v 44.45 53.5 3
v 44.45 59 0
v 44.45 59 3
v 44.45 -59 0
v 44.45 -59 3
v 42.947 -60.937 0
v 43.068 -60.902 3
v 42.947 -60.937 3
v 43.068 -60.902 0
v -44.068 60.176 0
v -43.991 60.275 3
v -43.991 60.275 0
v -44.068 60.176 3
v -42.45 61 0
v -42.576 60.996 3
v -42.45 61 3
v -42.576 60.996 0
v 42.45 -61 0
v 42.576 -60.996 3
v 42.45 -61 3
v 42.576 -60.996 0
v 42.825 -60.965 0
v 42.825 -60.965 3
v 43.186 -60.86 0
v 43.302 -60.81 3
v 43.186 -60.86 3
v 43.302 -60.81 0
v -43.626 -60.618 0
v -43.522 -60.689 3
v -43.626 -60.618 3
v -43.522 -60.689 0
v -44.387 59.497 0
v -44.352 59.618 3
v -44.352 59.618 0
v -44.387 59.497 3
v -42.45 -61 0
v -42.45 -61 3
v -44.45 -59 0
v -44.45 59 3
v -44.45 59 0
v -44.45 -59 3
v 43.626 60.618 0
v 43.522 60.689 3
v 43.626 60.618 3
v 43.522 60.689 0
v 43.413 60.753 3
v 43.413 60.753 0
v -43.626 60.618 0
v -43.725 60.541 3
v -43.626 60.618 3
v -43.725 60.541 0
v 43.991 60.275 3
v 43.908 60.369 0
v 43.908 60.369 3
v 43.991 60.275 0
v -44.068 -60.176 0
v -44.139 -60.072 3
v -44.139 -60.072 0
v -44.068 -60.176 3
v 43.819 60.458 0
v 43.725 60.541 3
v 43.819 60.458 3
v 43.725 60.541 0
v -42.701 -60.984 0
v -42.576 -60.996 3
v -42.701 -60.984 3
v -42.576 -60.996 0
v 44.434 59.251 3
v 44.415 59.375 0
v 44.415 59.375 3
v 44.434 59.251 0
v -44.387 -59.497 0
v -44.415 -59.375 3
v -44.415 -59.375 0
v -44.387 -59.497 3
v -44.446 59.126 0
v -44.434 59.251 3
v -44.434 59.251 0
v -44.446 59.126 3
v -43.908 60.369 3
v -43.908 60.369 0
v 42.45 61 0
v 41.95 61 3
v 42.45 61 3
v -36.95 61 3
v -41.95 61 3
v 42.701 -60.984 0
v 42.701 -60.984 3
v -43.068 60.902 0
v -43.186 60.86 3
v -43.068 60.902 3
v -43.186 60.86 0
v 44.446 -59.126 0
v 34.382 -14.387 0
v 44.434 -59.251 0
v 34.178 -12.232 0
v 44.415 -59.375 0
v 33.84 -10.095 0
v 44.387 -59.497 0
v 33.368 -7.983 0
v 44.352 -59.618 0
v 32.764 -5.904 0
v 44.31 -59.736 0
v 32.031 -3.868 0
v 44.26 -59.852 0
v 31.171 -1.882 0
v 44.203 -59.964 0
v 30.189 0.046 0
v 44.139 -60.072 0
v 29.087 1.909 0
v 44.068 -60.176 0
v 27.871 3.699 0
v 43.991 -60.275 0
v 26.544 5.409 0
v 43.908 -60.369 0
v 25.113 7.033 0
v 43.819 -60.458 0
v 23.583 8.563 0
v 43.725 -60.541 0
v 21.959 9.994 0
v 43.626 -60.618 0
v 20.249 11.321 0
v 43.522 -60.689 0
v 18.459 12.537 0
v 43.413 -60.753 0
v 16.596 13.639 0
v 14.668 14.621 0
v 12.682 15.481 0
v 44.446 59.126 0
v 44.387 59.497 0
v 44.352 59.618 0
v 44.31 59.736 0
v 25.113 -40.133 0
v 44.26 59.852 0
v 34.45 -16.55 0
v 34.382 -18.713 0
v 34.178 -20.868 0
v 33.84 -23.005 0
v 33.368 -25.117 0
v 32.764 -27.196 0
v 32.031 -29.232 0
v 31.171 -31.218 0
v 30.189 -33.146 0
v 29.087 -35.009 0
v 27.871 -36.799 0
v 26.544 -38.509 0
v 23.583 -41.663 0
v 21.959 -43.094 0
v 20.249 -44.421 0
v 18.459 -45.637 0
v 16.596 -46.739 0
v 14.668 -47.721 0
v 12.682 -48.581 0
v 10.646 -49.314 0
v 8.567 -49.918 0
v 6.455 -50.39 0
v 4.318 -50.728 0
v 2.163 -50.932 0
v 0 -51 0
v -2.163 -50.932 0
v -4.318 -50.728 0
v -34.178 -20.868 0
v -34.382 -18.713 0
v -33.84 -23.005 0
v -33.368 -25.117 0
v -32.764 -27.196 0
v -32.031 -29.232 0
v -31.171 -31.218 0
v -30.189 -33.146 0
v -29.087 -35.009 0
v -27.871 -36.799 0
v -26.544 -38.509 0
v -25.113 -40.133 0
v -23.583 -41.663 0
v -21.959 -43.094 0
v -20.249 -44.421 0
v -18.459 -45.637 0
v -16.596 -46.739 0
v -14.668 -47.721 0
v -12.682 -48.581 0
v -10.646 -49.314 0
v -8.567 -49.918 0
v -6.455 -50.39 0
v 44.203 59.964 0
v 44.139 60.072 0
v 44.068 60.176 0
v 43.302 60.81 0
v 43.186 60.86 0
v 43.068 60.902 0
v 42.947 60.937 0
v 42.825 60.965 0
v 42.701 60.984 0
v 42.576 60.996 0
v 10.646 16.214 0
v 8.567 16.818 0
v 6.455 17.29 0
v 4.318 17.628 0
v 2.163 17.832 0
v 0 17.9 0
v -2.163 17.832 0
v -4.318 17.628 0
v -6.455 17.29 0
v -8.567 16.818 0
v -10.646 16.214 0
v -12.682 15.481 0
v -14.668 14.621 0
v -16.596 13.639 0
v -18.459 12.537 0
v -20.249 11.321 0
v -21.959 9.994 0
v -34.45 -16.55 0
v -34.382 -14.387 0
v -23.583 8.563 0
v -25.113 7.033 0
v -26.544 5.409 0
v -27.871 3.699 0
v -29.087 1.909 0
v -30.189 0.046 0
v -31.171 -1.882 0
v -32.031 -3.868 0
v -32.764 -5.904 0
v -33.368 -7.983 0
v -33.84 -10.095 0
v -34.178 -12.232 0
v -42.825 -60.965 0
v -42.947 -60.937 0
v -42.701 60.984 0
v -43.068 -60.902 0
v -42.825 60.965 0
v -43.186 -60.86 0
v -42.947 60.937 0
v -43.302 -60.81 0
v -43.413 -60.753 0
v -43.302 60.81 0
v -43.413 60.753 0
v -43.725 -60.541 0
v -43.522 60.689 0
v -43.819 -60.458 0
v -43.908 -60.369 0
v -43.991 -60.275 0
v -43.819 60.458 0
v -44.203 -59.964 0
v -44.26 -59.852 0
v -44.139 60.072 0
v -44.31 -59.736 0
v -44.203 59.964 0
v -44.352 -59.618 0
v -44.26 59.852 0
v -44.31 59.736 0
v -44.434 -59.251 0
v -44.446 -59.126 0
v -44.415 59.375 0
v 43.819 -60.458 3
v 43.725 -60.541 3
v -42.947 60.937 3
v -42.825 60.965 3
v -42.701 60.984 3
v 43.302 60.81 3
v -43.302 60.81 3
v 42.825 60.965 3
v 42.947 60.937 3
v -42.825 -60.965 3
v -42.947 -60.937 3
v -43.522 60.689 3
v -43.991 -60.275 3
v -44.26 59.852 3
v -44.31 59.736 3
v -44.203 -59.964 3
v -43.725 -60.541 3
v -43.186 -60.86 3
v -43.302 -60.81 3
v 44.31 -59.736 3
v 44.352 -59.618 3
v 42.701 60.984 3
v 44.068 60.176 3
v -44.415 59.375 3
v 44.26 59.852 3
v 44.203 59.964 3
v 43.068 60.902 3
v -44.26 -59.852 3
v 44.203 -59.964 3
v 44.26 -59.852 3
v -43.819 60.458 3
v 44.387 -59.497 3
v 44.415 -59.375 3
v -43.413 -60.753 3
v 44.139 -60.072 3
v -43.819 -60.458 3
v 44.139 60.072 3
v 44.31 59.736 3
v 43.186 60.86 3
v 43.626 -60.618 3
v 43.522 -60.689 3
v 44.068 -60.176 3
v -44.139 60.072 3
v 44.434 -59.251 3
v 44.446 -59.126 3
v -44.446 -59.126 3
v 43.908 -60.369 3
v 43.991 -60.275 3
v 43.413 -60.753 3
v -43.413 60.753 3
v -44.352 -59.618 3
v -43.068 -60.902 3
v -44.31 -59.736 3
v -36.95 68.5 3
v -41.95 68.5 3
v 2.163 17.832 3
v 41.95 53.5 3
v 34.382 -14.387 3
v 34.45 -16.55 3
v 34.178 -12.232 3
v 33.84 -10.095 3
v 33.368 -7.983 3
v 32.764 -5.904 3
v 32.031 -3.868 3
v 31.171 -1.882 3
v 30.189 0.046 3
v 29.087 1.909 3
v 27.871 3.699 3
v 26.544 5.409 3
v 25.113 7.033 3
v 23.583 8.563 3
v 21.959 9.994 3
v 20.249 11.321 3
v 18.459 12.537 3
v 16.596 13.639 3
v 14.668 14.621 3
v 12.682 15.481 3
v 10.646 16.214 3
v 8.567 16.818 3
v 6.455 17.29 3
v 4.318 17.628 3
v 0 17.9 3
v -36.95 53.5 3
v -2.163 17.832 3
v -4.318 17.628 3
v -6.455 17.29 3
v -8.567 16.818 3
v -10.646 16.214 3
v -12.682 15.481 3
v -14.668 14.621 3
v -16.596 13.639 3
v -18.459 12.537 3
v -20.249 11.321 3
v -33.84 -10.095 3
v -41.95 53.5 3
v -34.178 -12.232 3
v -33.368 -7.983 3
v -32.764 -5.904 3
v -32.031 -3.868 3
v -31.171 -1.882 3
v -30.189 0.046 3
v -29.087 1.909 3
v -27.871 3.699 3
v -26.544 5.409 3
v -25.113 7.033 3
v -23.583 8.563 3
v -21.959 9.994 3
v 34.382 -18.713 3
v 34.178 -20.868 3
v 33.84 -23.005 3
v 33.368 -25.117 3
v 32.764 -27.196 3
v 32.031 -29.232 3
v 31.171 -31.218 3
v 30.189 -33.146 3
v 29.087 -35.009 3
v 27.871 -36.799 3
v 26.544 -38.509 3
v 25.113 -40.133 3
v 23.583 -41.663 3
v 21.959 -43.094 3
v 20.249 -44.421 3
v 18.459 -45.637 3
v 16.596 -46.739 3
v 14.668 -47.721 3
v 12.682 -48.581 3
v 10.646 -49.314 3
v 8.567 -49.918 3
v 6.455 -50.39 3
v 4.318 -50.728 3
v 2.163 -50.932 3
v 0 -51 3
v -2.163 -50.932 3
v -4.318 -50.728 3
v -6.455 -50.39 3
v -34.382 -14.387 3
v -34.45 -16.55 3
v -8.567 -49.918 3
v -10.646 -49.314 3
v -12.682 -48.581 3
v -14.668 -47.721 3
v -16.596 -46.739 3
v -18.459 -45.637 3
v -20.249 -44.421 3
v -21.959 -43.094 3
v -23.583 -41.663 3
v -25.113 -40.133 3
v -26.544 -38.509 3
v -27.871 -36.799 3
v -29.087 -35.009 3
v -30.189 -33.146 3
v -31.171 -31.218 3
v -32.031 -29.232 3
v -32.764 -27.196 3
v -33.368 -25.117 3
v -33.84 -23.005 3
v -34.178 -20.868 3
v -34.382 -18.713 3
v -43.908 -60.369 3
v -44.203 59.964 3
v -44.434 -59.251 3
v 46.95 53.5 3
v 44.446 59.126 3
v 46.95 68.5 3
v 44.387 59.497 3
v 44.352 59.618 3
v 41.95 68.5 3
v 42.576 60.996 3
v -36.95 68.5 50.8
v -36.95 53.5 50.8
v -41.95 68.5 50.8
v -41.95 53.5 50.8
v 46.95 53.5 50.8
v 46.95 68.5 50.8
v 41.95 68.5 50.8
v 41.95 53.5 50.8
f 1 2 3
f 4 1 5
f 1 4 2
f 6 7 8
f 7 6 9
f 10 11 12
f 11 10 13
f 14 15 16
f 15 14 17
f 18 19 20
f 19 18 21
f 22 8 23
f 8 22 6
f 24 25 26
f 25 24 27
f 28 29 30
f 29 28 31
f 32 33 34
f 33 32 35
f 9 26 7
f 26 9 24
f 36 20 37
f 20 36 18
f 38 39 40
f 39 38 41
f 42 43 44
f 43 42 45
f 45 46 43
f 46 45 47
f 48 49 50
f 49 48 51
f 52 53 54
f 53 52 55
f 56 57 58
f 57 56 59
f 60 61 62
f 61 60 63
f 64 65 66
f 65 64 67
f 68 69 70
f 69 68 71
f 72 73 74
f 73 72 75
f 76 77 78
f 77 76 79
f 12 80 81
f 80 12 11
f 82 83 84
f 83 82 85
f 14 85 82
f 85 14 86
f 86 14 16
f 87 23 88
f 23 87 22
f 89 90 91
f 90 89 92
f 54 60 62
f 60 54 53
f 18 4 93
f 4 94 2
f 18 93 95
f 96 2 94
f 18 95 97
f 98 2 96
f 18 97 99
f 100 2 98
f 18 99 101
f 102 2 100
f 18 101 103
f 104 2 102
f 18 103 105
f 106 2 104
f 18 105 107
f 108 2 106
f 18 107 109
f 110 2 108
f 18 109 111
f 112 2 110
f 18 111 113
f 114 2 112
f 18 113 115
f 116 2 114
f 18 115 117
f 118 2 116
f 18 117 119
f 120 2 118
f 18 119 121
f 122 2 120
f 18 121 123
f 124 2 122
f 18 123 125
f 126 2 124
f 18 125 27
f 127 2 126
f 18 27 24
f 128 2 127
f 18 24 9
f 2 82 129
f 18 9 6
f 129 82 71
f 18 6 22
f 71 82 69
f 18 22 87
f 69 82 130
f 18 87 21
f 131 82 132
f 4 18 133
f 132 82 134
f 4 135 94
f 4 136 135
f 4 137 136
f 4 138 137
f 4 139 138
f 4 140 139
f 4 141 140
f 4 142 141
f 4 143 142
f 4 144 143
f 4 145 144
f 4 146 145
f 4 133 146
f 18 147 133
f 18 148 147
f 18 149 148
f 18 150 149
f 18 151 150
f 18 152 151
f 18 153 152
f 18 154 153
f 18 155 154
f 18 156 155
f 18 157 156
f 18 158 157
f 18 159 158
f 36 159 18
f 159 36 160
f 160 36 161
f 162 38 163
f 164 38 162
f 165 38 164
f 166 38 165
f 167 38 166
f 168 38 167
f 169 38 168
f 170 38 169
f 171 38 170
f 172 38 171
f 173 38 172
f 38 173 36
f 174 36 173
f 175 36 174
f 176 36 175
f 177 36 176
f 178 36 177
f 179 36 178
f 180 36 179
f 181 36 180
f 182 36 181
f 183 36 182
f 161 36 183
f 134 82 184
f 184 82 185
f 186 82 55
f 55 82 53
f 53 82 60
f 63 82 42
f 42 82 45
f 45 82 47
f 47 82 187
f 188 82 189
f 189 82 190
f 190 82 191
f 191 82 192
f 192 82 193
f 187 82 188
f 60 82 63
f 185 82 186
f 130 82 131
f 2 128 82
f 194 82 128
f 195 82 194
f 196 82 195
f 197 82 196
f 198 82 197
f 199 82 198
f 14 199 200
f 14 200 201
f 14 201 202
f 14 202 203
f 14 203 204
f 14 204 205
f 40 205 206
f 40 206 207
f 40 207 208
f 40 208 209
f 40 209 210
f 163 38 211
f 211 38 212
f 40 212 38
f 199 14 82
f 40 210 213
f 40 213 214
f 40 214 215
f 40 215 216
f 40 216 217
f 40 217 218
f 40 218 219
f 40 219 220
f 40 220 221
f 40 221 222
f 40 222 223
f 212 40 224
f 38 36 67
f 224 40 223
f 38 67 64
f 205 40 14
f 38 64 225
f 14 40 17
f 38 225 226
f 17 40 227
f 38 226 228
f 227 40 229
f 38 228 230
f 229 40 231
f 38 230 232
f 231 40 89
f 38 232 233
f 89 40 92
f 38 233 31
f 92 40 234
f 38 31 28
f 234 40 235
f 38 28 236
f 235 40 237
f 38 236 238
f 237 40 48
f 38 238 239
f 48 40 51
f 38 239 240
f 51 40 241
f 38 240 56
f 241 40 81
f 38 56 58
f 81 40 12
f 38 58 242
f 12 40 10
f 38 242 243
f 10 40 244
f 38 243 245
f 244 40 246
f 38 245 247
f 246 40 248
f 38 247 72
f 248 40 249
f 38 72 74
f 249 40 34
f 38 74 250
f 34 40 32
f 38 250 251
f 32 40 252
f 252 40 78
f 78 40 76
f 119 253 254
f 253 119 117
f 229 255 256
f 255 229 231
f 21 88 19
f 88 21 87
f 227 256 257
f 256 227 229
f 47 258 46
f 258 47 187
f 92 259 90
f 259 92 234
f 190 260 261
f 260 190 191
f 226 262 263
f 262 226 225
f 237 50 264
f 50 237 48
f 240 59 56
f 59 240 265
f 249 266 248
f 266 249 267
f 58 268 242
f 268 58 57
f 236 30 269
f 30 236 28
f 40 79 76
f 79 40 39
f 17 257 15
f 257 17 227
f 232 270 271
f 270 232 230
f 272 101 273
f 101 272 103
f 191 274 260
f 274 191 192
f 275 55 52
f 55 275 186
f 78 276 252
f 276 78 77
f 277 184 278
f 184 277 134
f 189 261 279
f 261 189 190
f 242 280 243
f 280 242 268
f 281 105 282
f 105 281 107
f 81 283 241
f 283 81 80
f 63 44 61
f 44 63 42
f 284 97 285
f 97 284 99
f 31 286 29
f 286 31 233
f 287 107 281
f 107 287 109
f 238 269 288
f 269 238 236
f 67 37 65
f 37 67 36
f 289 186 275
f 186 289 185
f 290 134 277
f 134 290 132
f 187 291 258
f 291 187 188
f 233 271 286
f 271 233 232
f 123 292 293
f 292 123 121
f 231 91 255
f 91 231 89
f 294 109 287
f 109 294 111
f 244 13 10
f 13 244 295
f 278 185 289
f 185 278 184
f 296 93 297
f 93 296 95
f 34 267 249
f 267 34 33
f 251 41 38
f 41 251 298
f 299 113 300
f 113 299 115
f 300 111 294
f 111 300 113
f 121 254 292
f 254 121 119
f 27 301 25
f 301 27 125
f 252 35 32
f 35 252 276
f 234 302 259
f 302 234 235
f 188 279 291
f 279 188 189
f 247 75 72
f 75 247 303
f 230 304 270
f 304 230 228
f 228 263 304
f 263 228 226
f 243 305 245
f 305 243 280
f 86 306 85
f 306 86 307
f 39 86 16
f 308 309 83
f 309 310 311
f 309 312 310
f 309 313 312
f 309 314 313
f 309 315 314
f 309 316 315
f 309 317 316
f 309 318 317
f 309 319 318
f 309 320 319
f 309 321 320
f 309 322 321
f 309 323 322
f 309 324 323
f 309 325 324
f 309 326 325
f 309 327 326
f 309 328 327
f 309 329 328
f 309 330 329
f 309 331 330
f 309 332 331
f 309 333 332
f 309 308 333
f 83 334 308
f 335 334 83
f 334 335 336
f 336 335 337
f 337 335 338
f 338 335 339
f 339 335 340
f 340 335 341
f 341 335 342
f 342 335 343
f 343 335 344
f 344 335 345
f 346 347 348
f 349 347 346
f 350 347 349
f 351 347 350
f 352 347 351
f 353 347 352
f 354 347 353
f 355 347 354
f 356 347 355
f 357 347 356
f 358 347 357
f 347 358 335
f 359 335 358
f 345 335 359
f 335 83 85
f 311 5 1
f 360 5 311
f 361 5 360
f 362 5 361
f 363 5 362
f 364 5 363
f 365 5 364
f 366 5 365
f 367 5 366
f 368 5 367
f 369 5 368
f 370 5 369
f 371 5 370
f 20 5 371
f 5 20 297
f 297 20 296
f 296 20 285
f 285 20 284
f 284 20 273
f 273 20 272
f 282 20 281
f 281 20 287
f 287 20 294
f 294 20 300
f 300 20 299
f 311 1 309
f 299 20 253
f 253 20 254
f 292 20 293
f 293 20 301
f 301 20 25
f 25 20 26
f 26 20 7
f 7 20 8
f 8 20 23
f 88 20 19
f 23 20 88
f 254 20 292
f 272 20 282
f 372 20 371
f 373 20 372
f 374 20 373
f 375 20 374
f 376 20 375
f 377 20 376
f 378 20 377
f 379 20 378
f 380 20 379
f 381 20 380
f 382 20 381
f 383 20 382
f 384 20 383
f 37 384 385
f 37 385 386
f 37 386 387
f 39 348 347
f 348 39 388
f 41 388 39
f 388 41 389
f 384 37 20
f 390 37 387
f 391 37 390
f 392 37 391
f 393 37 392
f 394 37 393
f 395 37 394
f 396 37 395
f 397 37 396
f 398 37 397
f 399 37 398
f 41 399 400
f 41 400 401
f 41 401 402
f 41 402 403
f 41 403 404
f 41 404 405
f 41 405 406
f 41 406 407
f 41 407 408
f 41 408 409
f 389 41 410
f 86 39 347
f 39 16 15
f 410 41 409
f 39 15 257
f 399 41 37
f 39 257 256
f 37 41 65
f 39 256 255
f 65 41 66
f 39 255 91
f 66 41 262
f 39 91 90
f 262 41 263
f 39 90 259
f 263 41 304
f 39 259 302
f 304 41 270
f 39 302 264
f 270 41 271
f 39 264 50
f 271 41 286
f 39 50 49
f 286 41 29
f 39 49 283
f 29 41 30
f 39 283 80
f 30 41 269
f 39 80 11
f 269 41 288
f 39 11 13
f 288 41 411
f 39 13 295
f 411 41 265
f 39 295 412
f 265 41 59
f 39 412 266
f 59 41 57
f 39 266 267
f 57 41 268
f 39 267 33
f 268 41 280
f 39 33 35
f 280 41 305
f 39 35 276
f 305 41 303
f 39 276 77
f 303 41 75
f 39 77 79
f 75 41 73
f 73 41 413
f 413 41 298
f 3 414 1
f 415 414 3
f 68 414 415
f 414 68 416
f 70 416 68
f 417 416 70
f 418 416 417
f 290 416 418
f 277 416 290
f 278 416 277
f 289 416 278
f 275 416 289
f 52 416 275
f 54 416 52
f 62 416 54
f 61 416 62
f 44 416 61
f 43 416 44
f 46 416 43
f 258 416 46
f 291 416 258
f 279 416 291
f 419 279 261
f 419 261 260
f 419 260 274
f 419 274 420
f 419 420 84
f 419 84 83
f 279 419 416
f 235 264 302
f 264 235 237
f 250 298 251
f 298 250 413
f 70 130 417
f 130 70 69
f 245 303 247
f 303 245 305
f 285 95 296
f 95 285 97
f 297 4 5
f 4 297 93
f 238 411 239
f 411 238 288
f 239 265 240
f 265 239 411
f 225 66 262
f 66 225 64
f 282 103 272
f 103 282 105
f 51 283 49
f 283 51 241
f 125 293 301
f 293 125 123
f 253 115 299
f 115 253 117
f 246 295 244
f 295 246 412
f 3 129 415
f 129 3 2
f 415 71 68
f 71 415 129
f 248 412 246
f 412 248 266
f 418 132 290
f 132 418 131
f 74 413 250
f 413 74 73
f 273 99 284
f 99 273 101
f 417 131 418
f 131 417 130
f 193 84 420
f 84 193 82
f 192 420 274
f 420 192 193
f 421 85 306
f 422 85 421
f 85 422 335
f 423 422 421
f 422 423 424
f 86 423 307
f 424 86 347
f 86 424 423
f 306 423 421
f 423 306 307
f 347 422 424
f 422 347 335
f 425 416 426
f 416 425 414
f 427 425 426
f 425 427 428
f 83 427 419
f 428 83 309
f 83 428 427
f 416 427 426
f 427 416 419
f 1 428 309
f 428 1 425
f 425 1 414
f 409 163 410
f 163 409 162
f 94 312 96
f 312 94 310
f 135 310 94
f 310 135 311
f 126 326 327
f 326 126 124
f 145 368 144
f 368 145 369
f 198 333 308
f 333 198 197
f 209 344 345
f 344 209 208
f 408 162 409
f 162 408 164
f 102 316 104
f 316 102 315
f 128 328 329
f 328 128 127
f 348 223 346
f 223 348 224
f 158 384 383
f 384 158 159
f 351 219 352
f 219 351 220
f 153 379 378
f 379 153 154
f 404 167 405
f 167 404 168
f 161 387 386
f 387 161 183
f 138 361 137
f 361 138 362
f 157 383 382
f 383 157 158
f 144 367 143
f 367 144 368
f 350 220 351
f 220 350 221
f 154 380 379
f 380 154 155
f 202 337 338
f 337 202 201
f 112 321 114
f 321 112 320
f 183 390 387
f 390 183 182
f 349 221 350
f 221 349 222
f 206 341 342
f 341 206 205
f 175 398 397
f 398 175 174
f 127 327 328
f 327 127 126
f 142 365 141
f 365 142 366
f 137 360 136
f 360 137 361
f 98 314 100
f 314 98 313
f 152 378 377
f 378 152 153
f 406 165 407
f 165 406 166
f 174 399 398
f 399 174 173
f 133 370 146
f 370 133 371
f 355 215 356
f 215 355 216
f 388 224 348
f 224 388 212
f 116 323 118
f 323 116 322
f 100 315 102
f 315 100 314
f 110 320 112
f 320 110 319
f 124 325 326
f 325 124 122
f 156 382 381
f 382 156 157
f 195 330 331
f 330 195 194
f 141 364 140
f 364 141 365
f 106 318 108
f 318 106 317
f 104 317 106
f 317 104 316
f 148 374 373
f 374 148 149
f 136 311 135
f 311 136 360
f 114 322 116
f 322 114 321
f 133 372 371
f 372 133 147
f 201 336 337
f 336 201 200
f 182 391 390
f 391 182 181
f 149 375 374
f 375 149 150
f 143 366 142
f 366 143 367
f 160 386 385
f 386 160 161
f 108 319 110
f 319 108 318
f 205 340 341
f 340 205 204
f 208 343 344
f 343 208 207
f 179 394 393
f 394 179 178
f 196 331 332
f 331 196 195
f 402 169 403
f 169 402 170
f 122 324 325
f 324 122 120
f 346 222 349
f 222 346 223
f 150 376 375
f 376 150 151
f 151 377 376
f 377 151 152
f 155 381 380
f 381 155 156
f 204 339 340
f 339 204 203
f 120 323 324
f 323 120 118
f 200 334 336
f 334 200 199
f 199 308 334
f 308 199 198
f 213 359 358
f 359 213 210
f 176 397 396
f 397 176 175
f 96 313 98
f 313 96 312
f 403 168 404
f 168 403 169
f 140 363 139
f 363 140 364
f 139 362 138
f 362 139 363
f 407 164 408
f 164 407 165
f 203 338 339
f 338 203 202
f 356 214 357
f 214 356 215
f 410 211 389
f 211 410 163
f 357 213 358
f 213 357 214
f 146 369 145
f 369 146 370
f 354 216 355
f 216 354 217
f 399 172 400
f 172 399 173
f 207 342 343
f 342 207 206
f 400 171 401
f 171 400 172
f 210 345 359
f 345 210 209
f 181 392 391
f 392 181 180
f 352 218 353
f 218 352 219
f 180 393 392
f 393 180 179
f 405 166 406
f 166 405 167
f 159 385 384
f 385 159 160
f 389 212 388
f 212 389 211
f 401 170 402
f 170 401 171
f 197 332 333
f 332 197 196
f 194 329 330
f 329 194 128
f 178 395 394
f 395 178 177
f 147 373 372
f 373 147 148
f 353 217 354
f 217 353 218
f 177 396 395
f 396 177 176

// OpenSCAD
// Level Lock Awning Cover - OpenSCAD Version
// Compare with build123d to diagnose geometry issues

// === PARAMETERS ===
OUTER_WIDTH = 88.9;
OUTER_HEIGHT = 122.0;
BACK_PLATE_THICKNESS = 3.0;

// Lock opening
SIDE_CLEARANCE = 10.0;
TOP_CLEARANCE = 10.0;
LOCK_DIAMETER = OUTER_WIDTH - 2 * SIDE_CLEARANCE;  // ~68.9mm
LOCK_RADIUS = LOCK_DIAMETER / 2;

// Awning
AWNING_DEPTH = 50.8;
AWNING_THICKNESS = 5.0;
AWNING_ANGLE = 15.0;

// Sidewalls - tiny corner tabs
SIDEWALL_THICKNESS = 5.0;
SIDEWALL_HEIGHT = 15.0;

// Calculate circle position
circle_center_y = -(OUTER_HEIGHT / 2 - TOP_CLEARANCE - LOCK_RADIUS);

echo("=== Level Lock Awning - OpenSCAD ===");
echo(str("Back plate: ", OUTER_WIDTH, "W x ", OUTER_HEIGHT, "H x ", BACK_PLATE_THICKNESS, "D mm"));
echo(str("Lock opening diameter: ", LOCK_DIAMETER, "mm"));
echo(str("Circle center Y: ", circle_center_y));

$fn = 100;  // Smooth circles

module level_lock_awning() {
    difference() {
        union() {
            // 1. BACK PLATE with rounded corners
            translate([0, 0, BACK_PLATE_THICKNESS/2])
                linear_extrude(height=BACK_PLATE_THICKNESS, center=true)
                    offset(r=2.0)  // 2mm rounded corners
                        offset(r=-2.0)
                            square([OUTER_WIDTH, OUTER_HEIGHT], center=true);

            // 2. ANGLED AWNING TOP
            awning_y_pos = (OUTER_HEIGHT - AWNING_THICKNESS) / 2;
            height_diff = (AWNING_DEPTH - BACK_PLATE_THICKNESS) * tan(AWNING_ANGLE);

            // Create awning as a prism
            translate([0, awning_y_pos, BACK_PLATE_THICKNESS]) {
                polyhedron(
                    points = [
                        // Bottom face (at back plate level)
                        [-OUTER_WIDTH/2, -AWNING_THICKNESS/2, 0],
                        [OUTER_WIDTH/2, -AWNING_THICKNESS/2, 0],
                        [OUTER_WIDTH/2, AWNING_THICKNESS/2, 0],
                        [-OUTER_WIDTH/2, AWNING_THICKNESS/2, 0],
                        // Top face (angled forward)
                        [-OUTER_WIDTH/2, -AWNING_THICKNESS/2 + height_diff, AWNING_DEPTH - BACK_PLATE_THICKNESS],
                        [OUTER_WIDTH/2, -AWNING_THICKNESS/2 + height_diff, AWNING_DEPTH - BACK_PLATE_THICKNESS],
                        [OUTER_WIDTH/2, AWNING_THICKNESS/2 + height_diff, AWNING_DEPTH - BACK_PLATE_THICKNESS],
                        [-OUTER_WIDTH/2, AWNING_THICKNESS/2 + height_diff, AWNING_DEPTH - BACK_PLATE_THICKNESS]
                    ],
                    faces = [
                        [0,1,2,3],  // bottom
                        [4,5,6,7],  // top
                        [0,1,5,4],  // front
                        [2,3,7,6],  // back
                        [0,3,7,4],  // left
                        [1,2,6,5]   // right
                    ]
                );
            }

            // 3. LEFT CORNER TAB
            translate([-(OUTER_WIDTH - SIDEWALL_THICKNESS) / 2,
                      (OUTER_HEIGHT / 2) - (SIDEWALL_HEIGHT / 2),
                      BACK_PLATE_THICKNESS])
                cube([SIDEWALL_THICKNESS, SIDEWALL_HEIGHT, AWNING_DEPTH - BACK_PLATE_THICKNESS]);

            // 4. RIGHT CORNER TAB
            translate([(OUTER_WIDTH - SIDEWALL_THICKNESS) / 2,
                      (OUTER_HEIGHT / 2) - (SIDEWALL_HEIGHT / 2),
                      BACK_PLATE_THICKNESS])
                cube([SIDEWALL_THICKNESS, SIDEWALL_HEIGHT, AWNING_DEPTH - BACK_PLATE_THICKNESS]);
        }

        // 5. CUT CIRCLE for Level Lock Pro (through entire back plate)
        translate([0, circle_center_y, -0.5])
            cylinder(h=BACK_PLATE_THICKNESS + 1, r=LOCK_RADIUS, center=false);
    }
}

// Generate the part
level_lock_awning();
